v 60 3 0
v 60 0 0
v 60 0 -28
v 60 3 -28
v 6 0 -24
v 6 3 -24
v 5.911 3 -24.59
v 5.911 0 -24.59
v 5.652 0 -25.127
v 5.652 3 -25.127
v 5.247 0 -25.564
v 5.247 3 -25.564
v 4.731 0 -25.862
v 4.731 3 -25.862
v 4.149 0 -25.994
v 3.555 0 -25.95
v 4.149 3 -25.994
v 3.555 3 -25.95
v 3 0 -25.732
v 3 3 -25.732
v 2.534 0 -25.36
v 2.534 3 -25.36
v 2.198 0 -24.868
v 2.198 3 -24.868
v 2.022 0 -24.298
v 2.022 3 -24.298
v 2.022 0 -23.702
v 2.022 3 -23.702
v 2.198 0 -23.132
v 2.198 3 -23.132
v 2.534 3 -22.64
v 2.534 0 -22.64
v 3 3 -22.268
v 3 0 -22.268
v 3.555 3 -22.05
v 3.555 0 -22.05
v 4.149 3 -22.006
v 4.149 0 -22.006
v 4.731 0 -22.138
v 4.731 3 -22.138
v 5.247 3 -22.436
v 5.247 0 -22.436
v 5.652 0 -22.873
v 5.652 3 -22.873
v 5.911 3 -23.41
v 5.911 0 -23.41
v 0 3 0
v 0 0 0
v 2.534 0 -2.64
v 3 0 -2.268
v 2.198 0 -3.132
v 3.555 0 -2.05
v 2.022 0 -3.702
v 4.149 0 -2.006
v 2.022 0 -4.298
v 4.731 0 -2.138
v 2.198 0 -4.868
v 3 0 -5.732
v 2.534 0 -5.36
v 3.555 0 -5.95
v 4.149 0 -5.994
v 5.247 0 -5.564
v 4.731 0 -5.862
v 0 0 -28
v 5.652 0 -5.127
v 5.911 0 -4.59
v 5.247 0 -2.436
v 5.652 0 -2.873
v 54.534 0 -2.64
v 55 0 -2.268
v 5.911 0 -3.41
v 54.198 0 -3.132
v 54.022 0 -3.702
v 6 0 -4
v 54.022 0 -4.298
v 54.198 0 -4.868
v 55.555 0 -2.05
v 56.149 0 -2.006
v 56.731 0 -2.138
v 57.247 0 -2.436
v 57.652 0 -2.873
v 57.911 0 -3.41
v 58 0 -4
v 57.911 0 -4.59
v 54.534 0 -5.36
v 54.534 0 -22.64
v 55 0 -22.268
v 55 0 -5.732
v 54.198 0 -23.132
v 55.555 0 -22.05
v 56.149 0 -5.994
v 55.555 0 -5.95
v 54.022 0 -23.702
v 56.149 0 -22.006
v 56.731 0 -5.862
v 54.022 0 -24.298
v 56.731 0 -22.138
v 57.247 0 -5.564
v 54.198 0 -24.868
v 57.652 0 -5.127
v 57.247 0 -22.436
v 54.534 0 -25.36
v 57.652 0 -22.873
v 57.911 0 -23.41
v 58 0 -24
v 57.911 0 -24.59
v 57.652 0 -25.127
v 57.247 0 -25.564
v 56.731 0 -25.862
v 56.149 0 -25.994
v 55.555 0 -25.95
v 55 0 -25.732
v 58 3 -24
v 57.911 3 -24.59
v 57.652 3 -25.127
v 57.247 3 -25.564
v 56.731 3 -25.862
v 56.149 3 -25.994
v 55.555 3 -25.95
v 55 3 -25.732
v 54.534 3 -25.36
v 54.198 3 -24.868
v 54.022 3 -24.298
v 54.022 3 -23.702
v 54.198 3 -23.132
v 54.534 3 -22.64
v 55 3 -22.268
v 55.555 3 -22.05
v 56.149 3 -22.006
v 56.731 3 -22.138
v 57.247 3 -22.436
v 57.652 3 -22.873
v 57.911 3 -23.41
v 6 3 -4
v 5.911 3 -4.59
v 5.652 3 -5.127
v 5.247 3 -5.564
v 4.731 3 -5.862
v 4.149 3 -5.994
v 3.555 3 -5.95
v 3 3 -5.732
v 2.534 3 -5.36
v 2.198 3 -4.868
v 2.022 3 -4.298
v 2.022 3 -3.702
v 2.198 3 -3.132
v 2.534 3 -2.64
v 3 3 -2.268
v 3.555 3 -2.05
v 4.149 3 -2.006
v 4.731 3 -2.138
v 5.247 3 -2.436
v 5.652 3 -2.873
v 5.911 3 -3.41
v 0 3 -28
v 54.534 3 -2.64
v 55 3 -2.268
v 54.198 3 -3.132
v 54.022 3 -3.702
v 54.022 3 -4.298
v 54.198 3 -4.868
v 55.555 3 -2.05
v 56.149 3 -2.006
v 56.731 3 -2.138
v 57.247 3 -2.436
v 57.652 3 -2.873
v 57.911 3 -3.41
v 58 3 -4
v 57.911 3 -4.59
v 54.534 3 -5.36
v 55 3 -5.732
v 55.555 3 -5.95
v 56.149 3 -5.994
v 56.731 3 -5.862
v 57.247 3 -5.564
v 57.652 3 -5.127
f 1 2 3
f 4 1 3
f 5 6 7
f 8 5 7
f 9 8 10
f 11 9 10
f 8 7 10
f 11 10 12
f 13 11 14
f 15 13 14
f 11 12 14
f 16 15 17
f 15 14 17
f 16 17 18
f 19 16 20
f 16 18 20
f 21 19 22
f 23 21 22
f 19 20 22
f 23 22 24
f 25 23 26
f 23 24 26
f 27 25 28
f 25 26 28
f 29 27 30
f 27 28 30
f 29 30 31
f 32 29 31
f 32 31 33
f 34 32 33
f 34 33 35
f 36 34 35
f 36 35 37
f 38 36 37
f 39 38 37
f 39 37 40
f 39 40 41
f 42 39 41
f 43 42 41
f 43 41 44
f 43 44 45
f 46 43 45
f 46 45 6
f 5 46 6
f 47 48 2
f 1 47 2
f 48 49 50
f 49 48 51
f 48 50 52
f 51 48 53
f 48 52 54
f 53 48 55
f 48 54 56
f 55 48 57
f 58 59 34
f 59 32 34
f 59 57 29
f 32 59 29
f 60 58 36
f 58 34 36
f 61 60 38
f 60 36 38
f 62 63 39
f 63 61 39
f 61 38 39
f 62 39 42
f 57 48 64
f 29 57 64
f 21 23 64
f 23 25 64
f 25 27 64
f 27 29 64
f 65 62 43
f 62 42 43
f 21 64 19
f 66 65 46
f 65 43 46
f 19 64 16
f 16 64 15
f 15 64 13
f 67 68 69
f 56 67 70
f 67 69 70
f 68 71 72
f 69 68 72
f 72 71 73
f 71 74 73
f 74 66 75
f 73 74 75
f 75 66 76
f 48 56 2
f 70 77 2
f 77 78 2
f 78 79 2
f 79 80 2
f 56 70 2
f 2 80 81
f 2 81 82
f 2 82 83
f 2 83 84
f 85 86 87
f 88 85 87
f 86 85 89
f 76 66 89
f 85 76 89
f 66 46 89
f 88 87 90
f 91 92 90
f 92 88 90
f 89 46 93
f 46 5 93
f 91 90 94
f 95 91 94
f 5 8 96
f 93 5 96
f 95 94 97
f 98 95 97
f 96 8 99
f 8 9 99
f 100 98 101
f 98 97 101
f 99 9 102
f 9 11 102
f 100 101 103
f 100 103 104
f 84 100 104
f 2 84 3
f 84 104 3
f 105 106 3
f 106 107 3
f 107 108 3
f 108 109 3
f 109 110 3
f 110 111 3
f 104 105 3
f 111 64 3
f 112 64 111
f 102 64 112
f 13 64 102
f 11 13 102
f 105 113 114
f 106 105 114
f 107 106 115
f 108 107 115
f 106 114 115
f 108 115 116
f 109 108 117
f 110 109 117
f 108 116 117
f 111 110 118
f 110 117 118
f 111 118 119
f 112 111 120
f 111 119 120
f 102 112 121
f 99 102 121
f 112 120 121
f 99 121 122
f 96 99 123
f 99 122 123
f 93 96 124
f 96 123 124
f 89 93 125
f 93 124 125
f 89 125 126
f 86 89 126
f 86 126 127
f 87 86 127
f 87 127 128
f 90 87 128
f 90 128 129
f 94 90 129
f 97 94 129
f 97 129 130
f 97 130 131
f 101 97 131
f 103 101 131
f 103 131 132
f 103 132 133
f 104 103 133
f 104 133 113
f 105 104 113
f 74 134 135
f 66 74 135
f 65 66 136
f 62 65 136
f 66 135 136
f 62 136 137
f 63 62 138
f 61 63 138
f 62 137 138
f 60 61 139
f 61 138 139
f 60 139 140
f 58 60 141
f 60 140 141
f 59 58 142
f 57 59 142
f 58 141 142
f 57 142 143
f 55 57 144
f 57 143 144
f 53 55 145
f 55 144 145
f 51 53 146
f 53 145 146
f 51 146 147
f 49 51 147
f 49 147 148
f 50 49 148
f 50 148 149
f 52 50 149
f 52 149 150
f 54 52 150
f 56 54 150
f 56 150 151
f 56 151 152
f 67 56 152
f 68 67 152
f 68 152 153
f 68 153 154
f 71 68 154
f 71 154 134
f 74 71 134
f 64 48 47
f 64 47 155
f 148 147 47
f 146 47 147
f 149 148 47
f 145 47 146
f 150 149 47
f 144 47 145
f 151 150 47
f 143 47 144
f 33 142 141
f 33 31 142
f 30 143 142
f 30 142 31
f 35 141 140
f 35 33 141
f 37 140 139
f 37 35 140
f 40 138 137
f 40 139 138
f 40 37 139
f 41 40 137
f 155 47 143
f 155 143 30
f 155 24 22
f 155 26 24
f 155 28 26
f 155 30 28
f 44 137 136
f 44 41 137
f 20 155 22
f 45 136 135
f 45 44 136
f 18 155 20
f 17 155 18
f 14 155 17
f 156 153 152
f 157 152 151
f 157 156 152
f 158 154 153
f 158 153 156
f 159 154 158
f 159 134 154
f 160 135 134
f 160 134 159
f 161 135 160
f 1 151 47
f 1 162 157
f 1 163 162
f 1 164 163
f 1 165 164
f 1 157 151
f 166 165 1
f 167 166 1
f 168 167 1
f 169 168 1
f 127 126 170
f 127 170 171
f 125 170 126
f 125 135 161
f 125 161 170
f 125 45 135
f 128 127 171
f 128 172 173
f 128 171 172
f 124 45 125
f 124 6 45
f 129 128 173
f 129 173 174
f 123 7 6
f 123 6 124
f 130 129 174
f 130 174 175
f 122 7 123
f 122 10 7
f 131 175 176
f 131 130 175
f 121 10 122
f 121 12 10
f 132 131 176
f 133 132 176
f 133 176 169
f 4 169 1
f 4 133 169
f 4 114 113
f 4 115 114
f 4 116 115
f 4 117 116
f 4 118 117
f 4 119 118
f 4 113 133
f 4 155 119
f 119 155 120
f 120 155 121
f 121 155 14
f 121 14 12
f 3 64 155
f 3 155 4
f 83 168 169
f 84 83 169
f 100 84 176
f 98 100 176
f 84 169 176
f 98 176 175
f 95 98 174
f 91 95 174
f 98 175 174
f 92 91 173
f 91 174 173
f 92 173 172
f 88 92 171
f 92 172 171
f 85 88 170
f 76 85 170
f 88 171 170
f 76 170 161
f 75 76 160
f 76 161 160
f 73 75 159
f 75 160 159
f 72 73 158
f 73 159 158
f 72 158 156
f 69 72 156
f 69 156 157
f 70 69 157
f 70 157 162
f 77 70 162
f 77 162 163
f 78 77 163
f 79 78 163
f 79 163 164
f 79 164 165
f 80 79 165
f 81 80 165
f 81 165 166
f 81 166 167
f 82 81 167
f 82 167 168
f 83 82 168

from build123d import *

# Parameters (mm, degrees)
SKETCH2_W           = 60
SKETCH2_H           = 28
BOSS_EXTRUDE1_DEPTH = 3
SKETCH3_R           = 2
CUT_EXTRUDE1_DEPTH  = 4


with BuildPart() as part:
    # Sketch2 → Boss-Extrude1 (new body)
    with BuildSketch(Plane(origin=(0, 0, 0), x_dir=(1, 0, 0), z_dir=(0, 1, 0))):
        with Locations((30, 14)):
            Rectangle(SKETCH2_W, SKETCH2_H)
    extrude(amount=BOSS_EXTRUDE1_DEPTH)

    # Sketch3 → Cut-Extrude1 (cut, through all)
    with BuildSketch(Plane(origin=(0, 3, 0), x_dir=(1, 0, 0), z_dir=(0, 1, 0))):
        with Locations((4, 4)):
            Circle(SKETCH3_R)
        with Locations((4, 24)):
            Circle(SKETCH3_R)
        with Locations((56, 24)):
            Circle(SKETCH3_R)
        with Locations((56, 4)):
            Circle(SKETCH3_R)
    extrude(amount=-CUT_EXTRUDE1_DEPTH, mode=Mode.SUBTRACT)


solid = part.part
